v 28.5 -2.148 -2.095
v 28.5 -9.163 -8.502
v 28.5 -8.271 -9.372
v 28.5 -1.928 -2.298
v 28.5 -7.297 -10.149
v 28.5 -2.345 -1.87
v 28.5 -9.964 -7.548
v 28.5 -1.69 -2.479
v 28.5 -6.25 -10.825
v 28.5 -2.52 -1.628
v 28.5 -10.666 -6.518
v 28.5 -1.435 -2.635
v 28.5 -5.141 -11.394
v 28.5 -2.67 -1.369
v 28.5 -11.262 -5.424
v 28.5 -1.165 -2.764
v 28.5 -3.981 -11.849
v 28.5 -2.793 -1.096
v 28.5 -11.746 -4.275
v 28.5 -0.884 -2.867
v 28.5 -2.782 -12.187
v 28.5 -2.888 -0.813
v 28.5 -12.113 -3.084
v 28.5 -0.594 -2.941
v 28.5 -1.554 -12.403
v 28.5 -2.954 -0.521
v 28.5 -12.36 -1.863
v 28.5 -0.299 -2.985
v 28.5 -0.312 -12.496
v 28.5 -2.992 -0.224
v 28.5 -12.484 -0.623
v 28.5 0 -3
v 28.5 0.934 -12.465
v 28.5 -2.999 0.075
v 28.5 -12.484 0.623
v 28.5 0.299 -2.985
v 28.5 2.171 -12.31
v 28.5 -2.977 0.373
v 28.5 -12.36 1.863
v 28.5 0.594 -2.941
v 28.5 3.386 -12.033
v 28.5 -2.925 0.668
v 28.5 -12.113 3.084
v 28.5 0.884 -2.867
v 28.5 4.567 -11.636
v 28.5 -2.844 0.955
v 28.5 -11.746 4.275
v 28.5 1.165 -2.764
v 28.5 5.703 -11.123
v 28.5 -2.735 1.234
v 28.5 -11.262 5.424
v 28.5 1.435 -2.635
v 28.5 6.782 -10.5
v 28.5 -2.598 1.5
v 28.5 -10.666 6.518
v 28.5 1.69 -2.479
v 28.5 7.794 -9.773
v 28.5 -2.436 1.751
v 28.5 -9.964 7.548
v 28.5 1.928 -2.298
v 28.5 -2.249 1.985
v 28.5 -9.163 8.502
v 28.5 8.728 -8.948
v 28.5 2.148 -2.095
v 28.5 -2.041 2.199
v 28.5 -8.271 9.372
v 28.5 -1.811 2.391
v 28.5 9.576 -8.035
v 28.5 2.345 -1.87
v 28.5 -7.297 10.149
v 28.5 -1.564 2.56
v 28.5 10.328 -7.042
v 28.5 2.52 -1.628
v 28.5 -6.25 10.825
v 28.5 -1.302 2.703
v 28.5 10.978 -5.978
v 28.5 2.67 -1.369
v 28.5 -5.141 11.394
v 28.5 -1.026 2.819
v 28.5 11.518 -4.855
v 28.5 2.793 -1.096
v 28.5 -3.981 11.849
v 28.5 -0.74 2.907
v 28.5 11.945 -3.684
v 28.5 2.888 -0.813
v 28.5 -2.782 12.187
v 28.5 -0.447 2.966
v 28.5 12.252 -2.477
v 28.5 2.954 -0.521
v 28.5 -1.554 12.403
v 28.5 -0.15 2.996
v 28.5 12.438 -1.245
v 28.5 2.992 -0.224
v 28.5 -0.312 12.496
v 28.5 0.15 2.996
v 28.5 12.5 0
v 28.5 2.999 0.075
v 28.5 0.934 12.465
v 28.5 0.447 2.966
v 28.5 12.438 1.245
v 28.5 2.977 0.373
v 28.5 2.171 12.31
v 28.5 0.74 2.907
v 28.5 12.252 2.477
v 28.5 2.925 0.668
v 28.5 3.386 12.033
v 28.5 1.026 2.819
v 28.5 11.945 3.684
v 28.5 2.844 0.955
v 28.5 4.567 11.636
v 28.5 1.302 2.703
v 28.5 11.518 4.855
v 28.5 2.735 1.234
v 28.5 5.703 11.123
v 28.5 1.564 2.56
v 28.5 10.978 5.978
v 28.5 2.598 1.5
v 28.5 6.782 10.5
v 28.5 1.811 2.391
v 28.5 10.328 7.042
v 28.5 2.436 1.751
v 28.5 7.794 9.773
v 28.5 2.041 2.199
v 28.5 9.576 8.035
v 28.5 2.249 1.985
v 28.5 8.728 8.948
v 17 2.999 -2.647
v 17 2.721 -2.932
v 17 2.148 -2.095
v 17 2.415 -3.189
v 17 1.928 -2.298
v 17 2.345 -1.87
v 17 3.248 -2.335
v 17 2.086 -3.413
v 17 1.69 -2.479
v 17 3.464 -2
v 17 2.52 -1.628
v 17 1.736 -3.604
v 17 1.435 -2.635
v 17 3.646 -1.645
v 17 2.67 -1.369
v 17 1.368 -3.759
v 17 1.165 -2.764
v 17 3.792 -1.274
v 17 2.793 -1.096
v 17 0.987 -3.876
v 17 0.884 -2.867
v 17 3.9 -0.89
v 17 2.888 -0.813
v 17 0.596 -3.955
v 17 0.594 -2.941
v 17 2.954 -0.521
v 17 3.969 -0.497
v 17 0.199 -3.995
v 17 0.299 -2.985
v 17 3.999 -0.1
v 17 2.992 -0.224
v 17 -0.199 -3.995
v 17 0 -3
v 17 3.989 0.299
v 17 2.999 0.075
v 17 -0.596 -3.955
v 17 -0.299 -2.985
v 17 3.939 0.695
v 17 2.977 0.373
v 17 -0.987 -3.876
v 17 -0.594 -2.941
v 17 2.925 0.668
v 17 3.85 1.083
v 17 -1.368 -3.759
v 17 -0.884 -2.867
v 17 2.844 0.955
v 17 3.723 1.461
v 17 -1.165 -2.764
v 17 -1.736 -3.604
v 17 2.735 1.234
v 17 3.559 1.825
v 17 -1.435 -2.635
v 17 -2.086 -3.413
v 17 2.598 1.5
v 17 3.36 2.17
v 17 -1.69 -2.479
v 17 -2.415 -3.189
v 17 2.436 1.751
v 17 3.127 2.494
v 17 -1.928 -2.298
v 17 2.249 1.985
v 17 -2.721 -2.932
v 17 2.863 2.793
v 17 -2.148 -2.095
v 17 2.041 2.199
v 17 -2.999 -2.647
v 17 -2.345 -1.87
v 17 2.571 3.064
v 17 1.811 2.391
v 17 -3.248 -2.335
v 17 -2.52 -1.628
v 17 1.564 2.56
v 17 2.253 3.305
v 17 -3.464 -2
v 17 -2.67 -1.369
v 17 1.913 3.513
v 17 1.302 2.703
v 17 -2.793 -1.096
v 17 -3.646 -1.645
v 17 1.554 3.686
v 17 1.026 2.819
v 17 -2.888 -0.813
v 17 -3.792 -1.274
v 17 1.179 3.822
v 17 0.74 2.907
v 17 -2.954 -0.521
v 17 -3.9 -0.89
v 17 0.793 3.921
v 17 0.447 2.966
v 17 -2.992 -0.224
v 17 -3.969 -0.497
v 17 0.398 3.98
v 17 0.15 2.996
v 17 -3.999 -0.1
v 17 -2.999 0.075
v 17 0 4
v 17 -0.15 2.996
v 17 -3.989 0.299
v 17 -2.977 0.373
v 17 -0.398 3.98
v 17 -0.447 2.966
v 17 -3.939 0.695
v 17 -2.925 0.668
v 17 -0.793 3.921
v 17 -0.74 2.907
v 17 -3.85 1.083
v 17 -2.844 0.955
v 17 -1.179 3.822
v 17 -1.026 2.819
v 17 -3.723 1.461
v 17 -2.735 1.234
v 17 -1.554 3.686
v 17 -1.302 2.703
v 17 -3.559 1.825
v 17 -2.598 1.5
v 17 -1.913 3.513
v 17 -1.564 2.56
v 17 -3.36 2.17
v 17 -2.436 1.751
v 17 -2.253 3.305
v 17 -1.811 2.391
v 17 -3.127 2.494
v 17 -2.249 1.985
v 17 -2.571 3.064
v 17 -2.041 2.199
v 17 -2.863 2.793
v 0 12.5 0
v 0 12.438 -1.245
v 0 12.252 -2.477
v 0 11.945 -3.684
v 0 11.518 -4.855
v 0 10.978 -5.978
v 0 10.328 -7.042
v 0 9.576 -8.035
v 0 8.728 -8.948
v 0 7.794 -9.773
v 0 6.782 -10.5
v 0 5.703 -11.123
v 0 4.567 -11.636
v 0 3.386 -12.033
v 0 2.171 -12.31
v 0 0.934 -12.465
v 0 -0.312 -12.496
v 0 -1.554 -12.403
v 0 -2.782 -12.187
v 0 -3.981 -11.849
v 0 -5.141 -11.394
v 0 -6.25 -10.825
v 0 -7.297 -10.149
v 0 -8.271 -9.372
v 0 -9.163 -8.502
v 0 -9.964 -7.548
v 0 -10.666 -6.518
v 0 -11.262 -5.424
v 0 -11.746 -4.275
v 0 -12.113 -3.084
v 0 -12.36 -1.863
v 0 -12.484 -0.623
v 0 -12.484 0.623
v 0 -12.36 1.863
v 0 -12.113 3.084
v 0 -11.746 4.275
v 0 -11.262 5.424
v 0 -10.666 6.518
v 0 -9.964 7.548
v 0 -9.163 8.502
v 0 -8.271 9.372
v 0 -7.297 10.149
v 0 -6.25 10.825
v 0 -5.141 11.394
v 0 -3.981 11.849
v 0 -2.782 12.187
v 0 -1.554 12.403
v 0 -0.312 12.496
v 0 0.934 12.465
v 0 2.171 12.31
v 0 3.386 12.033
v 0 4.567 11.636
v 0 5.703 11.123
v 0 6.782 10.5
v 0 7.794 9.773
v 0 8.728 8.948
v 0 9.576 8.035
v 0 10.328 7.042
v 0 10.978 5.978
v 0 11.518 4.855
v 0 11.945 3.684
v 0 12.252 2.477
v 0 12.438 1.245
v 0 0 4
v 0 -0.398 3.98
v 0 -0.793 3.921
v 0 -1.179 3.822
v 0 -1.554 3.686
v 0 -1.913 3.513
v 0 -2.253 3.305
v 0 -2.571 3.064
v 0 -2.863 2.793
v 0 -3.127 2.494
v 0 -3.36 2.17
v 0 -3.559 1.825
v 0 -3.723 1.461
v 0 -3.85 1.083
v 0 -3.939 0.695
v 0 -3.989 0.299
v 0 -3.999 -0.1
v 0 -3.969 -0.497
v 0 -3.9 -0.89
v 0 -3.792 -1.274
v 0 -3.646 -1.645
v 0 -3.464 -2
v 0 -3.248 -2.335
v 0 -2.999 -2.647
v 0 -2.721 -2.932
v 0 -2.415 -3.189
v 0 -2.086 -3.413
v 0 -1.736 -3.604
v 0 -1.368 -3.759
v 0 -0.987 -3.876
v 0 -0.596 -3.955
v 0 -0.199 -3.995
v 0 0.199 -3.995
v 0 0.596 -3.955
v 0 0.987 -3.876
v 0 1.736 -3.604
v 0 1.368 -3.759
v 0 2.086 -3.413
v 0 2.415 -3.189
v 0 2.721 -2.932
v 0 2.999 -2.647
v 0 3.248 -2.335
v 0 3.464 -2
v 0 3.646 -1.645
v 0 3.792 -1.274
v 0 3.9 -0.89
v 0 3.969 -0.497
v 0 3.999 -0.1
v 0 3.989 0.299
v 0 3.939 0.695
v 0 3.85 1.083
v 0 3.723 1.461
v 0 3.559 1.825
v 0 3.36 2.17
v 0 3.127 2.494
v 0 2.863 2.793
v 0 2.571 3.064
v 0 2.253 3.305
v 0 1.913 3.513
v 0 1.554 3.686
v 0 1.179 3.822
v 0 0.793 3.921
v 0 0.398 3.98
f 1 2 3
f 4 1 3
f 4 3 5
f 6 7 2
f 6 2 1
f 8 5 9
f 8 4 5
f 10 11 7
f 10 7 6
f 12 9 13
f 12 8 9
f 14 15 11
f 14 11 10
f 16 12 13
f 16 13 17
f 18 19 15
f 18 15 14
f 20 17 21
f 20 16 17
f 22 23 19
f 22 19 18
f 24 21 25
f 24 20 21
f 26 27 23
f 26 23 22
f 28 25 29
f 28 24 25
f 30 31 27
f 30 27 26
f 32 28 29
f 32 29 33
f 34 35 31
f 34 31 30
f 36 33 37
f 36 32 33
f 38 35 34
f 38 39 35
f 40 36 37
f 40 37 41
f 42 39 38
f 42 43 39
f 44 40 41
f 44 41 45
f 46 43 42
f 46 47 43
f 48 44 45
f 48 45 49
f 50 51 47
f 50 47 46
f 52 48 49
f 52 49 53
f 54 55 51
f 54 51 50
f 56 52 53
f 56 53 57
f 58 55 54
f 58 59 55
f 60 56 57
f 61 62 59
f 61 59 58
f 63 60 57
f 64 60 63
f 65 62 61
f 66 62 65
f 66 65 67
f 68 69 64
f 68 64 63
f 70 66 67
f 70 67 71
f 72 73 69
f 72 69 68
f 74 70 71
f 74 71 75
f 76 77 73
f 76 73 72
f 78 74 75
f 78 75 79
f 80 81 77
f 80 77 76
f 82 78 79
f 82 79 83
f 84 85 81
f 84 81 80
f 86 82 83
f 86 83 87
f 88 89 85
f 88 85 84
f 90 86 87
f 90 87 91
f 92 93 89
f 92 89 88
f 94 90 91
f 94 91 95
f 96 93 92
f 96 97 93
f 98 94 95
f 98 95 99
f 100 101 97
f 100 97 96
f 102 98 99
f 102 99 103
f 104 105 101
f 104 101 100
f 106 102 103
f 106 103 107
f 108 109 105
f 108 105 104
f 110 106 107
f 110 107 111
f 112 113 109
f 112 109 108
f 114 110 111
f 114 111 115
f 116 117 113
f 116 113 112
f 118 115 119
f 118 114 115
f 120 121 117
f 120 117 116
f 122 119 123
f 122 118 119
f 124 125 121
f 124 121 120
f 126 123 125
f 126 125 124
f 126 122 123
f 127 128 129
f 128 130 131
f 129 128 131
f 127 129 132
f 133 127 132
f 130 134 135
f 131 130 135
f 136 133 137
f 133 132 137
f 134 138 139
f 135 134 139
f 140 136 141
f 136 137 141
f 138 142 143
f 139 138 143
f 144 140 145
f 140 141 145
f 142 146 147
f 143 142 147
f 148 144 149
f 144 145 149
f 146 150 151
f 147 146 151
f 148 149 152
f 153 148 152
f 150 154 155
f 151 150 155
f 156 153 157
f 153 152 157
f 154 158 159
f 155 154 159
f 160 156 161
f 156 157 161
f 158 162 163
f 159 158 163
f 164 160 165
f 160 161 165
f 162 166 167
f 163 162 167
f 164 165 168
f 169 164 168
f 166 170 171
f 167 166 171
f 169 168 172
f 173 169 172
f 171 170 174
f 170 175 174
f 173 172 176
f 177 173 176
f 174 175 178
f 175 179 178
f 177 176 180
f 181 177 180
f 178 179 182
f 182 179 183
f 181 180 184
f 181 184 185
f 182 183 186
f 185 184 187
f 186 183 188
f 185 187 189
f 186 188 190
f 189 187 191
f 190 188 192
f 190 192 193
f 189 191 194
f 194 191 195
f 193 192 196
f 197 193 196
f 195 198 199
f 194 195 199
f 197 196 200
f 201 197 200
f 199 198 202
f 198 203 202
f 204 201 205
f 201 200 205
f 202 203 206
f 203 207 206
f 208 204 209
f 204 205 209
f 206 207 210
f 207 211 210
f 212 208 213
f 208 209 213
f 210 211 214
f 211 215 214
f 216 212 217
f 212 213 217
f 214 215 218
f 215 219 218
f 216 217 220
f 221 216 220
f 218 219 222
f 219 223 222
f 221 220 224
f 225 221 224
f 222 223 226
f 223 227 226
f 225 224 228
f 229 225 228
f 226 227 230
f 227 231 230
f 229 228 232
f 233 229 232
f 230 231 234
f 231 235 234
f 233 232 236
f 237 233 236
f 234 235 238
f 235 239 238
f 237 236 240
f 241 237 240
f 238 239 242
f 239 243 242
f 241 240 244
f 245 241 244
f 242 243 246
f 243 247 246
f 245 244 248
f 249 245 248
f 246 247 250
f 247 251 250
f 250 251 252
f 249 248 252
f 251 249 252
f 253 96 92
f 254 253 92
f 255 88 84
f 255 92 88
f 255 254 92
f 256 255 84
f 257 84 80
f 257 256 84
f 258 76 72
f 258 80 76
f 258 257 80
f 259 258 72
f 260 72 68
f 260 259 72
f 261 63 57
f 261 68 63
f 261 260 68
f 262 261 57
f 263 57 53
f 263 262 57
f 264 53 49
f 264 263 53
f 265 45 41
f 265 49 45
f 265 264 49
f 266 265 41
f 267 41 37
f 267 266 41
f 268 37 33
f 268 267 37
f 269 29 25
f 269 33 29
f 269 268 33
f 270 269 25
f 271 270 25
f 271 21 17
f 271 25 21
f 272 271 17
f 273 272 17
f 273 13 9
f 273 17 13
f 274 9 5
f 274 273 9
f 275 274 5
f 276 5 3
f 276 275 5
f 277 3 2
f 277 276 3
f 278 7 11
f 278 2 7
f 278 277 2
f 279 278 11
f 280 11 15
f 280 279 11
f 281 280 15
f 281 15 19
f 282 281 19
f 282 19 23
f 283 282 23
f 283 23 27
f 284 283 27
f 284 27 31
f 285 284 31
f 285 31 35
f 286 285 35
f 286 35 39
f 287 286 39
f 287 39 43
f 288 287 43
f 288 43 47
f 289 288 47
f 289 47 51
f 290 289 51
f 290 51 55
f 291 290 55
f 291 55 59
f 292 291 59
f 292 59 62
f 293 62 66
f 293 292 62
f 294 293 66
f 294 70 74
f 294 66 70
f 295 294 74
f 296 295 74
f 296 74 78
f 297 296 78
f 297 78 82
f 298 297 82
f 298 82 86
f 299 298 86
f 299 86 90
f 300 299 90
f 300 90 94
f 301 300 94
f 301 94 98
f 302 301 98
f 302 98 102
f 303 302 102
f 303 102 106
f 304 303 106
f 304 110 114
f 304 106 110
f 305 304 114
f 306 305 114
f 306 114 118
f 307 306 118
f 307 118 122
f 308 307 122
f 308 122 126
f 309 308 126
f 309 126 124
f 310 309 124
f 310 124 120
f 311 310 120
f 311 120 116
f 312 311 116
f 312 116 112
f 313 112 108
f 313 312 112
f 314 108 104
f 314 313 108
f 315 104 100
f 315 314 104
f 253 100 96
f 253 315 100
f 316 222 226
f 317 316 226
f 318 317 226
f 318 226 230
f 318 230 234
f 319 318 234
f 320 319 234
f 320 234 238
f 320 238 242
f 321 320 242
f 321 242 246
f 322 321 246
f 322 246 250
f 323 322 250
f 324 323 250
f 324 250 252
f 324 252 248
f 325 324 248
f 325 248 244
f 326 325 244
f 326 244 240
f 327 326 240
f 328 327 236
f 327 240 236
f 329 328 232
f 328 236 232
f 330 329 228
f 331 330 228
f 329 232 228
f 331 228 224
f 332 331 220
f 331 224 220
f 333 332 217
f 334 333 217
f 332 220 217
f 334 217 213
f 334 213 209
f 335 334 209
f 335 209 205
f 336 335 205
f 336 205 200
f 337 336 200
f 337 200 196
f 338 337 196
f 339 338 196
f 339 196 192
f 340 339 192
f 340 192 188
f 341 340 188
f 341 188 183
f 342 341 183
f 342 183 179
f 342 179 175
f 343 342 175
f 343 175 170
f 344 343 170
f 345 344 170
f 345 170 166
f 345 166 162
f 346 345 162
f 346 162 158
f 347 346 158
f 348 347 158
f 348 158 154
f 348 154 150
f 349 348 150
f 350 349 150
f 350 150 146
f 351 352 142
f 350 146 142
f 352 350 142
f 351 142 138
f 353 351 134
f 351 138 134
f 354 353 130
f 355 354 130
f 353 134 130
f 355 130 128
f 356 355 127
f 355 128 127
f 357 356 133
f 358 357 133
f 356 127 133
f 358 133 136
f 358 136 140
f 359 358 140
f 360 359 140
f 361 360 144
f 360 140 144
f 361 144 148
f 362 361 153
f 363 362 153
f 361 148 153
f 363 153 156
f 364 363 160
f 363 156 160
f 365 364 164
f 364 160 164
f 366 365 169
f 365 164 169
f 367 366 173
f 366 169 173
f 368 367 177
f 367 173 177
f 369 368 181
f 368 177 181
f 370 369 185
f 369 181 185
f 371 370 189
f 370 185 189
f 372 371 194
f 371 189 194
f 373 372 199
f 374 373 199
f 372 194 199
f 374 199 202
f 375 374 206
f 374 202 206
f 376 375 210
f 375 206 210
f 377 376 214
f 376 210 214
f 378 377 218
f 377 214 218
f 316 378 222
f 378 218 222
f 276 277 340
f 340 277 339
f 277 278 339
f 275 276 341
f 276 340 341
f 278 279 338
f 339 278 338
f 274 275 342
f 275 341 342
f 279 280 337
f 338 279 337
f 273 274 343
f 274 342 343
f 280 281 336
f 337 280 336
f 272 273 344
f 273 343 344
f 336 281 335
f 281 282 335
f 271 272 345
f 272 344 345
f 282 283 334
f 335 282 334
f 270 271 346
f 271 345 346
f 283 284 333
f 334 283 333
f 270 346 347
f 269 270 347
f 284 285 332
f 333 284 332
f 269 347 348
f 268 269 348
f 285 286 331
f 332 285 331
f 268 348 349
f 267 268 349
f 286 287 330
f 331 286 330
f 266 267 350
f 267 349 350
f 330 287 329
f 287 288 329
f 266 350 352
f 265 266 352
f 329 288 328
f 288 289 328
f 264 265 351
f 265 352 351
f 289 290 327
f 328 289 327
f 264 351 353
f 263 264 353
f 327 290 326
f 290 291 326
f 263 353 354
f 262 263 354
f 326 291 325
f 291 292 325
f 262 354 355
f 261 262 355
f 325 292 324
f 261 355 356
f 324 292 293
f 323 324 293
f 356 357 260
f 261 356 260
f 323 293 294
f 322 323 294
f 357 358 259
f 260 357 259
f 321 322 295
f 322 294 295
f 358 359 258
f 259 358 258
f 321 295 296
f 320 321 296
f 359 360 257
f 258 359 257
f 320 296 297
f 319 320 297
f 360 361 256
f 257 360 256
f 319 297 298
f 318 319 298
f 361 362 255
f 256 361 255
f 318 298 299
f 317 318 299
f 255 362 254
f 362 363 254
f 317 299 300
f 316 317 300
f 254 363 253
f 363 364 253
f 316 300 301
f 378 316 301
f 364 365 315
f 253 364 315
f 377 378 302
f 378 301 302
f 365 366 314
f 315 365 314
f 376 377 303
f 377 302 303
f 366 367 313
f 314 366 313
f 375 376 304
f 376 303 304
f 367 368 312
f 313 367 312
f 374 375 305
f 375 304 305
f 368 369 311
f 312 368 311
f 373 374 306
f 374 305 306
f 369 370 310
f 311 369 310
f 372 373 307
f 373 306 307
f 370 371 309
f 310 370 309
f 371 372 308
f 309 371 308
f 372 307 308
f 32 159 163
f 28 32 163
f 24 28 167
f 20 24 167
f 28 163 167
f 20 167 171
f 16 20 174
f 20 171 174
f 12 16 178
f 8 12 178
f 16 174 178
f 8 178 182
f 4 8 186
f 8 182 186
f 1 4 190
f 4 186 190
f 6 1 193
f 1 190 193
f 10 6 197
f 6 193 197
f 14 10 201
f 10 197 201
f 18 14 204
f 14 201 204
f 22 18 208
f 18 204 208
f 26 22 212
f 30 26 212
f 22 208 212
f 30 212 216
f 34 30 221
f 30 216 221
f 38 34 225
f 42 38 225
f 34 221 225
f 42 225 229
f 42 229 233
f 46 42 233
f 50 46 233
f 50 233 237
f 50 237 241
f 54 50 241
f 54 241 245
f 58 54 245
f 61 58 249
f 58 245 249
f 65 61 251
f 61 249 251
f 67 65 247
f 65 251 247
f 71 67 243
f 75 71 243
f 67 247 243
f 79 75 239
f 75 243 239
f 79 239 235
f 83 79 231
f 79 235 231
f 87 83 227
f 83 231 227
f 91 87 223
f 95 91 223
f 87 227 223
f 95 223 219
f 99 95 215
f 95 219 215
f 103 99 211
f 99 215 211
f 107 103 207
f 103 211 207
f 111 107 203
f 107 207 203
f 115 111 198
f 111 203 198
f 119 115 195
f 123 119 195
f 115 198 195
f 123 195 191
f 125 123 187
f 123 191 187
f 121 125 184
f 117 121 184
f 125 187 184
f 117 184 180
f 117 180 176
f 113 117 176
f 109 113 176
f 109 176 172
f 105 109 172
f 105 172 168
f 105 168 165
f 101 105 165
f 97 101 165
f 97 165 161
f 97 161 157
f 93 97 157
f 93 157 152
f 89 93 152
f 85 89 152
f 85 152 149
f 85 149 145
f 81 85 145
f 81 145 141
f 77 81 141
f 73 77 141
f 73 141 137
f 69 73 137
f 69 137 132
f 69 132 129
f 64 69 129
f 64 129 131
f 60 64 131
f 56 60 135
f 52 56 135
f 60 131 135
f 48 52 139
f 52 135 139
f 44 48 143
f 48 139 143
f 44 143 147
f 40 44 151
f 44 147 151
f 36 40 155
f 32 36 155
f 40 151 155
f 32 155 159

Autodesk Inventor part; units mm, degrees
ref_plane "YZ Plane" through (0, 0, 0) normal (1, 0, 0) x (0, 1, 0)
ref_plane "XZ Plane" through (0, 0, 0) normal (0, 1, 0) x (-1, 0, 0)
ref_plane "XY Plane" through (0, 0, 0) normal (0, 0, 1) x (1, 0, 0)
sketch "スケッチ1" plane through (0, 0, 0) normal (1, 0, 0) x (0, 1, 0)
  circle A0 centre (0, 0) radius 12.5
  dimension "d0" = 25
extrude "押し出し1" add sketch "スケッチ1" along normal blind 28.5
sketch "スケッチ2" plane through (28.5, 0, 0) normal (1, 0, 0) x (0, 0, -1)
  point P0 (0, 0)
  point P1 (0, 0)
hole "穴1" at (28.5, 0, 0) direction (-1, 0, 0) diameter 6 end through all
sketch "スケッチ3" plane through (0, 0, 0) normal (-1, 0, 0) x (0, 0, 1)
  circle A0 centre (0, 0) radius 3 projected
hole "穴2" at (0, 0, 0) direction (1, 0, 0) diameter 8 depth 17
properties part number "OC25S-6-8" material "アルミニウム 6061"
